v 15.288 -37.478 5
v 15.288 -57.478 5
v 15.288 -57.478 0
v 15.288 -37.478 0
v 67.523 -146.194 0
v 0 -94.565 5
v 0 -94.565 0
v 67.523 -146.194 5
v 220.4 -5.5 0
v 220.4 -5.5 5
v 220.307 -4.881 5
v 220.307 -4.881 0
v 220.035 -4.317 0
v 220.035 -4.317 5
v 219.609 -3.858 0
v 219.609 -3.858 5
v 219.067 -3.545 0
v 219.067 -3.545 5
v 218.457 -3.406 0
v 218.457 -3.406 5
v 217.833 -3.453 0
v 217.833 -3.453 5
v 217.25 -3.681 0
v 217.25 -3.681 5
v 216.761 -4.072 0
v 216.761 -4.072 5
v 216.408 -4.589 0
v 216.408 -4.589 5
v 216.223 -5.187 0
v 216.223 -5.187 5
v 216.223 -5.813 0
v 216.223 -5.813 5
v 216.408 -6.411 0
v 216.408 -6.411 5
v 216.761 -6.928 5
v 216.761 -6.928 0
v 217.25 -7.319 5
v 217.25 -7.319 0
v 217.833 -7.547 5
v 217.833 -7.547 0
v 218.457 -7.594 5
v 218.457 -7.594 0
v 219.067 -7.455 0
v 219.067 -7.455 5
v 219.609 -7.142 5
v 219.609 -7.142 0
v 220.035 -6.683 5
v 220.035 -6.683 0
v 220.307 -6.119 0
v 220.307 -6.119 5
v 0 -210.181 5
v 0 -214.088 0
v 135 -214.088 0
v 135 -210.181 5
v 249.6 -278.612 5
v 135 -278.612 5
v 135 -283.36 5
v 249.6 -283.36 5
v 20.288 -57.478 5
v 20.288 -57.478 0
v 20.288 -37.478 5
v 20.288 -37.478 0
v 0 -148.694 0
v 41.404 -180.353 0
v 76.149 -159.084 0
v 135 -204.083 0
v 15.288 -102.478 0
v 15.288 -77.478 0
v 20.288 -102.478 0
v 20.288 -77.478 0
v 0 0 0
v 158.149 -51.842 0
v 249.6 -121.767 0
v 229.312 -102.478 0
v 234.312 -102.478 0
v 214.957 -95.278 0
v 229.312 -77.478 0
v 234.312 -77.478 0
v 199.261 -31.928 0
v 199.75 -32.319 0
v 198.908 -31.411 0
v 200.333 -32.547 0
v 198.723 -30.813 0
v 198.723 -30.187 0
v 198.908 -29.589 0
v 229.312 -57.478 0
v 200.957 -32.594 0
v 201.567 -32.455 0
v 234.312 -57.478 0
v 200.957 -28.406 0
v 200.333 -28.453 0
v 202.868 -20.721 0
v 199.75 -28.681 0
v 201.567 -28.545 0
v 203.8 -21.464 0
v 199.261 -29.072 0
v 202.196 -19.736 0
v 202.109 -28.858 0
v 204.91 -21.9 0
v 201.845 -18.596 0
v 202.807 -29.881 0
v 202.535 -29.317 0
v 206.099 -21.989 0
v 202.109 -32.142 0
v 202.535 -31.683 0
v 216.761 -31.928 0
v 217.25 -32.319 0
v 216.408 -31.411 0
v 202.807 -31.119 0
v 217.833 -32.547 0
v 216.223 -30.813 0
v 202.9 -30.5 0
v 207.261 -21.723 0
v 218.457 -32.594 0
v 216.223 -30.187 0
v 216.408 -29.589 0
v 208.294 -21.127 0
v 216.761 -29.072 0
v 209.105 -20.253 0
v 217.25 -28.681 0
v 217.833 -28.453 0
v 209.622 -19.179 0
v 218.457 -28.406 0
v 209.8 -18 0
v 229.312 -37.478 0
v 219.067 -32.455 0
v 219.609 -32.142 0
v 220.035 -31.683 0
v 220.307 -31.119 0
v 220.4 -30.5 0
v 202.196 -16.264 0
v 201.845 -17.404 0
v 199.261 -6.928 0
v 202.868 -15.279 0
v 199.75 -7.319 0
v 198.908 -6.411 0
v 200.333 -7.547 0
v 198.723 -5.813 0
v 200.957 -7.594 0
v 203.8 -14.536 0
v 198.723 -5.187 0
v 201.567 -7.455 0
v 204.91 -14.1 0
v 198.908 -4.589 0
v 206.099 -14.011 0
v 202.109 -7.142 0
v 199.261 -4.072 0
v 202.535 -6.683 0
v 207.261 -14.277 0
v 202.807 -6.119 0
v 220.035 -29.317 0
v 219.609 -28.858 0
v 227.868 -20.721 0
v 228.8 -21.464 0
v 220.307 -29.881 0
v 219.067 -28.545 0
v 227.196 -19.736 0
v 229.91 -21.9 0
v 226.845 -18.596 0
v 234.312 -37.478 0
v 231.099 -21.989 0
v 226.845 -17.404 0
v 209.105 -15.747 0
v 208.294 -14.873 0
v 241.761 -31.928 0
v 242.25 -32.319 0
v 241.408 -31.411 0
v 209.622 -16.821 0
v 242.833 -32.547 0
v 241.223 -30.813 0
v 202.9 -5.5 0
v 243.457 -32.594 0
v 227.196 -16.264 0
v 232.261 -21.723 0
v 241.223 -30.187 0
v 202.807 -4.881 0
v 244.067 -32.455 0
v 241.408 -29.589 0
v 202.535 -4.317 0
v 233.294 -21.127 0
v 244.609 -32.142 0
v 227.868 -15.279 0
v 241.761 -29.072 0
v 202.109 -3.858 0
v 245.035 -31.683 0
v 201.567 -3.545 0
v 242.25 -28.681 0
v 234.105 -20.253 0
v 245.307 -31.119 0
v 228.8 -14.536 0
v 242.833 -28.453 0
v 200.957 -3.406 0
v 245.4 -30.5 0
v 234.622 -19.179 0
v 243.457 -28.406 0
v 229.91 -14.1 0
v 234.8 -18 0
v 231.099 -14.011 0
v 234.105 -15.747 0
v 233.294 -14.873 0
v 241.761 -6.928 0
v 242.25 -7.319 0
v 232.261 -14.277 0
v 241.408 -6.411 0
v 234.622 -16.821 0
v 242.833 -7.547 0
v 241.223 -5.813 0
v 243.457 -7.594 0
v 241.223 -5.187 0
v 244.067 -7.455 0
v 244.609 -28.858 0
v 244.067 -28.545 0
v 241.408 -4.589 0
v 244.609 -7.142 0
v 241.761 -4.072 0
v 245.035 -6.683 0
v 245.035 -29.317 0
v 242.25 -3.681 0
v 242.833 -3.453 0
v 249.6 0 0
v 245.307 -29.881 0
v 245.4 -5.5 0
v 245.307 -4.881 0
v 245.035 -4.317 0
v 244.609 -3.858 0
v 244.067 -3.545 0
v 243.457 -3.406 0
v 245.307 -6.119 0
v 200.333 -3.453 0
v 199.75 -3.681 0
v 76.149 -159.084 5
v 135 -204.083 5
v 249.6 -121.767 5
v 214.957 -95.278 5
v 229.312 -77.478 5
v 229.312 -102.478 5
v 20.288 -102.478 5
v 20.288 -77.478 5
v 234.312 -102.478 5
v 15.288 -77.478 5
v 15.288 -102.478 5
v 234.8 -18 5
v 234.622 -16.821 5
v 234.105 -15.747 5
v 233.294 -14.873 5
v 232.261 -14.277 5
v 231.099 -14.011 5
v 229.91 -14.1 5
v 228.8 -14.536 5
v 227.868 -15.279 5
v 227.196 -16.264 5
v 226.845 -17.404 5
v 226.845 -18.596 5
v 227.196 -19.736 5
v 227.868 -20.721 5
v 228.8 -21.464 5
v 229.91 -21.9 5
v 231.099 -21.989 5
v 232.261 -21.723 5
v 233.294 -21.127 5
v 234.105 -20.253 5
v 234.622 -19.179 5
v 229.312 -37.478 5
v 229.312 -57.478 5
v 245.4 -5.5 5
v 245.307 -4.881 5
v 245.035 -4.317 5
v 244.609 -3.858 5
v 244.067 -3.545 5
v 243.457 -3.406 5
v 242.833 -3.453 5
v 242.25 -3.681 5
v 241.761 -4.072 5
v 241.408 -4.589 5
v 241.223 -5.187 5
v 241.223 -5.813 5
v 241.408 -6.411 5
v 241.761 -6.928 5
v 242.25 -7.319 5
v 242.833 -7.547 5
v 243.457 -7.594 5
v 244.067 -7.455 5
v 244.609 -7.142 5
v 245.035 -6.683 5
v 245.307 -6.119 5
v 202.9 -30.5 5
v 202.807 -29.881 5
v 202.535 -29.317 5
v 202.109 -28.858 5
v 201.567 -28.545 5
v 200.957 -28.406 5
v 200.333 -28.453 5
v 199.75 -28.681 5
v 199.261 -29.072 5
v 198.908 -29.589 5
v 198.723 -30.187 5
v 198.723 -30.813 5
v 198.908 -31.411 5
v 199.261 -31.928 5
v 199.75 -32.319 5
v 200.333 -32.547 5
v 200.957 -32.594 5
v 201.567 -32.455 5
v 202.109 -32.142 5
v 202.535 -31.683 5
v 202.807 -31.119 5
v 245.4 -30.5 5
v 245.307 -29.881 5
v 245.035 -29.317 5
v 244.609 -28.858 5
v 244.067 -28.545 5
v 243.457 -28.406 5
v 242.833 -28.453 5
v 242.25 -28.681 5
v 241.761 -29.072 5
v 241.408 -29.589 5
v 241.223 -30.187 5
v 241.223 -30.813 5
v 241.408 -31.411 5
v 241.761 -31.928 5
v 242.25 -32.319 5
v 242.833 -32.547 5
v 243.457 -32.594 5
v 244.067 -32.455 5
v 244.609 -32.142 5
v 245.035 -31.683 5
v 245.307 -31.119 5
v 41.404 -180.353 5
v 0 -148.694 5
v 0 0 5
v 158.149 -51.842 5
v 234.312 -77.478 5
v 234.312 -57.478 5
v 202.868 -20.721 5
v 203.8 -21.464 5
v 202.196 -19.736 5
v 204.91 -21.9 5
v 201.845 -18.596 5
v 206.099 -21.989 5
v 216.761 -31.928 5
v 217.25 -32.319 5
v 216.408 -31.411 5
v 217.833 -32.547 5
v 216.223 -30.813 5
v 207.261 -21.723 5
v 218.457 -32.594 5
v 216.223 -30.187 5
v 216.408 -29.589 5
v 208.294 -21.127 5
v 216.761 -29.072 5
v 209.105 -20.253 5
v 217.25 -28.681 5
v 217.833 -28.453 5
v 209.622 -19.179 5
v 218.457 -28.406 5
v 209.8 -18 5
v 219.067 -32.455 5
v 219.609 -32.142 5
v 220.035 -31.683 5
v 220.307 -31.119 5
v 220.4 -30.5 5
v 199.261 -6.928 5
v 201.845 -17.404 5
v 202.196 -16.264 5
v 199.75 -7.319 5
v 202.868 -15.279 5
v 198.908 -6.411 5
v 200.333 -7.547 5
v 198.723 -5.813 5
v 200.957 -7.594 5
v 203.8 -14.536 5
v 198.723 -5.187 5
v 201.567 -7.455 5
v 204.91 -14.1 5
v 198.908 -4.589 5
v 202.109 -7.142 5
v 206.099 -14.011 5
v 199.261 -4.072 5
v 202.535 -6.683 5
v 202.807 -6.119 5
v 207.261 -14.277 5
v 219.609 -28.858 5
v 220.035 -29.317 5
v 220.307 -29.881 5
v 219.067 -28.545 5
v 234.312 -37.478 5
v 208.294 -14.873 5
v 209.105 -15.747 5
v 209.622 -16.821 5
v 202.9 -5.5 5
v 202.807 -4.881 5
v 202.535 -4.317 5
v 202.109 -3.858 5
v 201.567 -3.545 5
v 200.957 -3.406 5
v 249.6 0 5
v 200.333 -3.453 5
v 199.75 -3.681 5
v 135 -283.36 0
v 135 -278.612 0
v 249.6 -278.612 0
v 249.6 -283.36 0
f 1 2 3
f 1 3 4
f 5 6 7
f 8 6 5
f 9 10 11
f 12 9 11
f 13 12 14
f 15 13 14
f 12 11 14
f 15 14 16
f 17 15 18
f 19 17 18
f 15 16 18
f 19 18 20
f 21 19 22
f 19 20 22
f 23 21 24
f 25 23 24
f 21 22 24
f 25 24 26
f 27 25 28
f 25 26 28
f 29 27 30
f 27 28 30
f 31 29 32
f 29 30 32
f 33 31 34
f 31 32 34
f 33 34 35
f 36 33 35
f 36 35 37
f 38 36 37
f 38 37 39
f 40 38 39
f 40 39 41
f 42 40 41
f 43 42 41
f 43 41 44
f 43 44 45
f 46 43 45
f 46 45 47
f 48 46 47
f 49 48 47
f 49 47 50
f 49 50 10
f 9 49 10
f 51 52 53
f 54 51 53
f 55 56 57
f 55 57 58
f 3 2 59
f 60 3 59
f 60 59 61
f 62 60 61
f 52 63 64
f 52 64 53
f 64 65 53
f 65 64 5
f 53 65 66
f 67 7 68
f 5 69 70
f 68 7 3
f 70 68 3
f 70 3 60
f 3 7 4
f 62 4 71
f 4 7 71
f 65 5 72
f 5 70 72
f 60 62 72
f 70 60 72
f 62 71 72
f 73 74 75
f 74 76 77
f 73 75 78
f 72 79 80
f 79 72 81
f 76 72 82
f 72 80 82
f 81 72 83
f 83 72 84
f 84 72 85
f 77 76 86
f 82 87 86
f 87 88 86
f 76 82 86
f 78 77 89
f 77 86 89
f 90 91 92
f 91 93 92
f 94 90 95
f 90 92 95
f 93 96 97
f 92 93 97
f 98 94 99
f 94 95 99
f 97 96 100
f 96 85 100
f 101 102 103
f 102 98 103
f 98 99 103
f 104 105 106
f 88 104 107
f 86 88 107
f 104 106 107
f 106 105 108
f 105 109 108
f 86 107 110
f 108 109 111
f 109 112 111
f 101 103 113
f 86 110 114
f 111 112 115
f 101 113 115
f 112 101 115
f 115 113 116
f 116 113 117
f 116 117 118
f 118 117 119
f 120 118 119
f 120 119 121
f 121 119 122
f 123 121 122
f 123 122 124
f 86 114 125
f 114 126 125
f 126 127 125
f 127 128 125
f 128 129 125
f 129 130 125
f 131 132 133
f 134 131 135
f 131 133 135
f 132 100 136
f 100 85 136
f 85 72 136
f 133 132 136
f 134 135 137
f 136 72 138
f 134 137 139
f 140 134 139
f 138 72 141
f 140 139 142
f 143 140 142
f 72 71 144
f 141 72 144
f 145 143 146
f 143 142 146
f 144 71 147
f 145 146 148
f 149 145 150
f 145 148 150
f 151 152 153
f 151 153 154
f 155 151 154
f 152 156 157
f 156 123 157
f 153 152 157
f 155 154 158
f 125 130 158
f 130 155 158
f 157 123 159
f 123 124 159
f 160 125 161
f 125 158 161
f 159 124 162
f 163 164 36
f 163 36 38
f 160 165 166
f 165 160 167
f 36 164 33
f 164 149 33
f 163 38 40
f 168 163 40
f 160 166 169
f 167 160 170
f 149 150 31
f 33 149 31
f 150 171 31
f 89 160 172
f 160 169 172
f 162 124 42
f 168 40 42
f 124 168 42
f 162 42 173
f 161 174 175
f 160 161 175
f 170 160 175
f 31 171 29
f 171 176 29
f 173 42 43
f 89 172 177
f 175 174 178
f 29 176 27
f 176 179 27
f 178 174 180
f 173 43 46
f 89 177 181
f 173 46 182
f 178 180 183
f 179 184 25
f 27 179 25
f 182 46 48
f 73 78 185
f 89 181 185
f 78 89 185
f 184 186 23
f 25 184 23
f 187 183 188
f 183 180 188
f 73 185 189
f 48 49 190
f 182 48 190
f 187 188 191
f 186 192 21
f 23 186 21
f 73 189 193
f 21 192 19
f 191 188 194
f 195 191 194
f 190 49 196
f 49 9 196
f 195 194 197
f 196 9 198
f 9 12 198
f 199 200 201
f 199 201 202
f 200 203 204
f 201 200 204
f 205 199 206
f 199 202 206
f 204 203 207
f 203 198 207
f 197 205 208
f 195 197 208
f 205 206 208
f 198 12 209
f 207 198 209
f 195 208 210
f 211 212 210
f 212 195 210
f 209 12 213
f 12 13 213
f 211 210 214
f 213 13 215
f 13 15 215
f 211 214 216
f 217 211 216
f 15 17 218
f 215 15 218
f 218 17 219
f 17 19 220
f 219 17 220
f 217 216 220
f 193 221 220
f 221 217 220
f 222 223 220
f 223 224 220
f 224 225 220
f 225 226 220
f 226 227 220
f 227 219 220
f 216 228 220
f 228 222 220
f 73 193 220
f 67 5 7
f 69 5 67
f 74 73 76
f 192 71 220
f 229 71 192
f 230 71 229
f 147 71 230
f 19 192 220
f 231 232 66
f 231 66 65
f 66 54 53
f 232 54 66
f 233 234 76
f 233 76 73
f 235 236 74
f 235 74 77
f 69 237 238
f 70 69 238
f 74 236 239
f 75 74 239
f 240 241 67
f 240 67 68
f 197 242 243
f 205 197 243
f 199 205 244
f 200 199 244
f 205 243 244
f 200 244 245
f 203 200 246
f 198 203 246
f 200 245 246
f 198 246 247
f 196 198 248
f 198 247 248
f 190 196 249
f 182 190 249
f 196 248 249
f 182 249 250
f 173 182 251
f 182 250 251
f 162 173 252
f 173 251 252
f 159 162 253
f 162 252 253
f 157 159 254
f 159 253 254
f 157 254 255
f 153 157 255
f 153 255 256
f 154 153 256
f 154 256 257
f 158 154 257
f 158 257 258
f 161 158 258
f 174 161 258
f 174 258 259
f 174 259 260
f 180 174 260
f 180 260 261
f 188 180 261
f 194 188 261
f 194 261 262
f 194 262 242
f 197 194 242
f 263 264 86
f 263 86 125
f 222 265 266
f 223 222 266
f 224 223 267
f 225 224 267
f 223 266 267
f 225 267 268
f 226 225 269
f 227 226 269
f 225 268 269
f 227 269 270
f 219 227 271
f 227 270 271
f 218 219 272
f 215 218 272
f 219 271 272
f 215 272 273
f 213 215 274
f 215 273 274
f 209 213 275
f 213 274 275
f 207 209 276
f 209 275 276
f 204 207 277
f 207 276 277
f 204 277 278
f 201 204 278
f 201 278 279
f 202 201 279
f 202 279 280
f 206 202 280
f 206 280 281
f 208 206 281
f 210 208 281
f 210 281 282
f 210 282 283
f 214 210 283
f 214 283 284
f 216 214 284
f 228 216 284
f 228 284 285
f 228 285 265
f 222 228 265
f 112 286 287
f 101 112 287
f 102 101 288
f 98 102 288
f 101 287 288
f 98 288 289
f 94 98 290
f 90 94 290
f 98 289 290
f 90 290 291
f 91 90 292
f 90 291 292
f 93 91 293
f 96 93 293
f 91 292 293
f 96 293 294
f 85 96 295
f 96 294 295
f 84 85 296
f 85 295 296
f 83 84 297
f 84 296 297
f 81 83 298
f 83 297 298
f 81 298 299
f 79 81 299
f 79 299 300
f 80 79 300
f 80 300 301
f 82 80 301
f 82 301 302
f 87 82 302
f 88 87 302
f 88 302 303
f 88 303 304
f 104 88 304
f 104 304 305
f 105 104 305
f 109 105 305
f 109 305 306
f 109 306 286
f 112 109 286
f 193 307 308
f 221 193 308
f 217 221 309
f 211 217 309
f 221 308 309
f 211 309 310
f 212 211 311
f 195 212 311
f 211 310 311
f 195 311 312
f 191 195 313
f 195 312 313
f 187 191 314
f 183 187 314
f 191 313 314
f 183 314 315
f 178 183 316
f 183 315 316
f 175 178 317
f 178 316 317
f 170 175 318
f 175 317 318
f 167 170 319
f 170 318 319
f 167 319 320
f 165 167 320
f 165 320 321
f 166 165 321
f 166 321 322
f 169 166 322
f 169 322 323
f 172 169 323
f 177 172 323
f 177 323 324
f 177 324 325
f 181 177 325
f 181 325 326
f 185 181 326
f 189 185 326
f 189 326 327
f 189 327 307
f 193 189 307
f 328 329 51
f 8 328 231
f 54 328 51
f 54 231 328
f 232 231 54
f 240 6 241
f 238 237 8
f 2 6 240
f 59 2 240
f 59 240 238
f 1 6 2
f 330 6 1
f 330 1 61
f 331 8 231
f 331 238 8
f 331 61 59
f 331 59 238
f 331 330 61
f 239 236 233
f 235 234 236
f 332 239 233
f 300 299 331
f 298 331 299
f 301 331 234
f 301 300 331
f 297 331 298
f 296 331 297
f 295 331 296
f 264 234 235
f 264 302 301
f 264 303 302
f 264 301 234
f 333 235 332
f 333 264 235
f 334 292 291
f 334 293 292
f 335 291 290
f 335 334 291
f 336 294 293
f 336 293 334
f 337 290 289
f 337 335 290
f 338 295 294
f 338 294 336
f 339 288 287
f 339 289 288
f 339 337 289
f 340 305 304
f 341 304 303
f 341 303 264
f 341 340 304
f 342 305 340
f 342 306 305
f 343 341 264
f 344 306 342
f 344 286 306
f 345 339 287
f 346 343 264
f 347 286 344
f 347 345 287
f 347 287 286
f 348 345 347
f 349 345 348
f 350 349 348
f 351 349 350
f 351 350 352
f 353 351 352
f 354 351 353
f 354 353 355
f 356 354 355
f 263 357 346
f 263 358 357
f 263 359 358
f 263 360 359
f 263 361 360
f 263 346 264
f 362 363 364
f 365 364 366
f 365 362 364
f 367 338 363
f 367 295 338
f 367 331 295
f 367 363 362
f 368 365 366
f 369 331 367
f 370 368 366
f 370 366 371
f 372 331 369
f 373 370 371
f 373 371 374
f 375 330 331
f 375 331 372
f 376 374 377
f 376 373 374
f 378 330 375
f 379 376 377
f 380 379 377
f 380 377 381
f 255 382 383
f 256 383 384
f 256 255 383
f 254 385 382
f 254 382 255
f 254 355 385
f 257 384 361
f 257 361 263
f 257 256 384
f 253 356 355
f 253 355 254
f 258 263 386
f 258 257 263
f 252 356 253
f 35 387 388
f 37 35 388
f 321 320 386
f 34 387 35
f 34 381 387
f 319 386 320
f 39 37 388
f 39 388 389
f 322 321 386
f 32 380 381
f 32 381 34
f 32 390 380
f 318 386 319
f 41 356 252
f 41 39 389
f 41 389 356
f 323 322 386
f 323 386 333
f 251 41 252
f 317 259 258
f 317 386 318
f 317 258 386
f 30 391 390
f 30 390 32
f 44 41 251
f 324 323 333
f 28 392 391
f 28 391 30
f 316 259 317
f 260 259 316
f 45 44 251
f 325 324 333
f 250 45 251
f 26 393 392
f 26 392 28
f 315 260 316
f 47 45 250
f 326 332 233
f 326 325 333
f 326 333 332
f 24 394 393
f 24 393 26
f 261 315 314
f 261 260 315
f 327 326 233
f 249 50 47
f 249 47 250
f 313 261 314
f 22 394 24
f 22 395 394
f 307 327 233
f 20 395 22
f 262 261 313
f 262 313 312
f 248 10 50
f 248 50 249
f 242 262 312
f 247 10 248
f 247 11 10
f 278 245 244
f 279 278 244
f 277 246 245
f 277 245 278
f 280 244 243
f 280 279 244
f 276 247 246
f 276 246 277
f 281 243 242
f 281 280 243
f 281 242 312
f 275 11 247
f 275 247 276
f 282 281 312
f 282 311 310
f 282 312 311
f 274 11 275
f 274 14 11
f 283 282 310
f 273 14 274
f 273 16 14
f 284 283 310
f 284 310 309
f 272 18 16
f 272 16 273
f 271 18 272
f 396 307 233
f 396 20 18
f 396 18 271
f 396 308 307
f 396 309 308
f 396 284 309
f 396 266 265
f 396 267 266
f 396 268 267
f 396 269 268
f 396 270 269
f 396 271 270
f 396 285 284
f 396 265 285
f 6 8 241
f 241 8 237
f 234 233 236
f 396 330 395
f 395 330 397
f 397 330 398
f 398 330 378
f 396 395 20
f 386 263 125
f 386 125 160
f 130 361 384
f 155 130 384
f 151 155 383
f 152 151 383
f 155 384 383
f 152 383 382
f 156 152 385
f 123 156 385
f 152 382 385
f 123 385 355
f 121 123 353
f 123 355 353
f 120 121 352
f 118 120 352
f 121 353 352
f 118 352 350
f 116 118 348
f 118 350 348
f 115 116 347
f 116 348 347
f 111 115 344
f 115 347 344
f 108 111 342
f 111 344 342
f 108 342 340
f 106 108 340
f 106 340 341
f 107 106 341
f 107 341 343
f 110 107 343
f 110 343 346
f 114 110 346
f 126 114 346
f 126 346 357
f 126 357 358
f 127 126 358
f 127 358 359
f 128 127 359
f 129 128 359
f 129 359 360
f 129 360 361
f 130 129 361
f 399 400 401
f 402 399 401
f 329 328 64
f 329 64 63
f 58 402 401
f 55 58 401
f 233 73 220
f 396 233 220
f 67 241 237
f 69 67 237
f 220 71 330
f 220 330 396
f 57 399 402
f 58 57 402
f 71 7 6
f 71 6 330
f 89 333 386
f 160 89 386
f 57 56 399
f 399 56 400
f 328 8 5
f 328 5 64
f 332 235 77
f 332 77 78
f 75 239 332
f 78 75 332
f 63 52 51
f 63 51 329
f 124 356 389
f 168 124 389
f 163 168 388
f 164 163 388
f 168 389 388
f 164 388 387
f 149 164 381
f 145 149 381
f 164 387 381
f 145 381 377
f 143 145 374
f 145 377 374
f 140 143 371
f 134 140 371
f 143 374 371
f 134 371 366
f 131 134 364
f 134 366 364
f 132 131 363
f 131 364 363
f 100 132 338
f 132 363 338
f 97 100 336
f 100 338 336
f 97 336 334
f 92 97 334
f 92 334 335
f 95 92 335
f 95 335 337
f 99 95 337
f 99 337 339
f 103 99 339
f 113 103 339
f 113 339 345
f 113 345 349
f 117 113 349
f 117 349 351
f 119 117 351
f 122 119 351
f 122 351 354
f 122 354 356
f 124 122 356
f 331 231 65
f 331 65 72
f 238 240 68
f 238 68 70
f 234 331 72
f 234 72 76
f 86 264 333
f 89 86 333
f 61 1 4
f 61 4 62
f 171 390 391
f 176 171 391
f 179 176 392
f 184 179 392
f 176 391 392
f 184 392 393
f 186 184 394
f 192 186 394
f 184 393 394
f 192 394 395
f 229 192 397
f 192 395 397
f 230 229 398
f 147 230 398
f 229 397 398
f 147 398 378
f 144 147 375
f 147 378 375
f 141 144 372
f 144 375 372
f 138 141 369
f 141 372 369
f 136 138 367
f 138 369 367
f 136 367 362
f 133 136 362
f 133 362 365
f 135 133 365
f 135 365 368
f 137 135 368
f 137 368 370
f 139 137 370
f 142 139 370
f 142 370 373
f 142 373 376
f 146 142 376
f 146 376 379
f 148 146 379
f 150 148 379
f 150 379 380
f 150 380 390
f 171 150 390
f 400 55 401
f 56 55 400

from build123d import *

# Parameters (mm, degrees)
SKETCH1_W           = 249.6
SKETCH1_H           = 283.36
BOSS_EXTRUDE1_DEPTH = 5
SKETCH3_W           = 135
SKETCH3_H           = 230.014345446
CUT_EXTRUDE1_DEPTH  = 193
CUT_EXTRUDE2_DEPTH  = 6
CUT_EXTRUDE3_DEPTH  = 6
SKETCH6_R           = 2.1
SKETCH6_R_2         = 4
CUT_EXTRUDE4_DEPTH  = 6
SKETCH7_W           = 5
SKETCH7_H           = 20
SKETCH7_H_2         = 25
CUT_EXTRUDE5_DEPTH  = 6


with BuildPart() as part:
    # Sketch1 → Boss-Extrude1 (new body)
    with BuildSketch(Plane.XY):
        with Locations((124.8, -141.68)):
            Rectangle(SKETCH1_W, SKETCH1_H)
    extrude(amount=BOSS_EXTRUDE1_DEPTH)

    # Sketch3 → Cut-Extrude1 (cut)
    with BuildSketch(Plane(origin=(0, -132.940025556, 103.864131154), x_dir=(1, 0, 0), z_dir=(0, 0.788010754, -0.615661475))):
        with Locations((67.5, 103.601456608)):
            Rectangle(SKETCH3_W, SKETCH3_H)
    extrude(amount=-CUT_EXTRUDE1_DEPTH, mode=Mode.SUBTRACT)

    # Sketch4 → Cut-Extrude2 (cut, through all)
    with BuildSketch(Plane.XY.offset(5)):
        Polygon((214.957001473, -95.278291976), (249.6, -121.767183305), (249.6, -278.612119258), (135, -278.612119258), (135, -204.083134422), (76.149175745, -159.084342324), (158.149444505, -51.841832454), align=None)
    extrude(amount=-CUT_EXTRUDE2_DEPTH, mode=Mode.SUBTRACT)

    # Sketch5 → Cut-Extrude3 (cut, through all)
    with BuildSketch(Plane.XY.offset(5)):
        Polygon((0, -94.564658056), (67.52306177, -146.194456905), (41.404457646, -180.353182271), (-26.118604124, -128.723383422), align=None)
    extrude(amount=-CUT_EXTRUDE3_DEPTH, mode=Mode.SUBTRACT)

    # Sketch6 → Cut-Extrude4 (cut, through all)
    with BuildSketch(Plane.XY.offset(5)):
        with Locations((243.3, -5.5)):
            Circle(SKETCH6_R)
        with Locations((243.3, -30.5)):
            Circle(SKETCH6_R)
        with Locations((218.3, -30.5)):
            Circle(SKETCH6_R)
        with Locations((218.3, -5.5)):
            Circle(SKETCH6_R)
        with Locations((200.8, -30.5)):
            Circle(SKETCH6_R)
        with Locations((200.8, -5.5)):
            Circle(SKETCH6_R)
        with Locations((205.8, -18)):
            Circle(SKETCH6_R_2)
        with Locations((230.8, -18)):
            Circle(SKETCH6_R_2)
    extrude(amount=-CUT_EXTRUDE4_DEPTH, mode=Mode.SUBTRACT)

    # Sketch7 → Cut-Extrude5 (cut, through all)
    with BuildSketch(Plane.XY.offset(5)):
        with Locations((17.788155616, -47.477871486)):
            Rectangle(SKETCH7_W, SKETCH7_H)
        with Locations((231.811844384, -47.477871486)):
            Rectangle(SKETCH7_W, SKETCH7_H)
        with Locations((17.788155616, -89.977871486)):
            Rectangle(SKETCH7_W, SKETCH7_H_2)
        with Locations((231.811844384, -89.977871486)):
            Rectangle(SKETCH7_W, SKETCH7_H_2)
    extrude(amount=-CUT_EXTRUDE5_DEPTH, mode=Mode.SUBTRACT)


solid = part.part
